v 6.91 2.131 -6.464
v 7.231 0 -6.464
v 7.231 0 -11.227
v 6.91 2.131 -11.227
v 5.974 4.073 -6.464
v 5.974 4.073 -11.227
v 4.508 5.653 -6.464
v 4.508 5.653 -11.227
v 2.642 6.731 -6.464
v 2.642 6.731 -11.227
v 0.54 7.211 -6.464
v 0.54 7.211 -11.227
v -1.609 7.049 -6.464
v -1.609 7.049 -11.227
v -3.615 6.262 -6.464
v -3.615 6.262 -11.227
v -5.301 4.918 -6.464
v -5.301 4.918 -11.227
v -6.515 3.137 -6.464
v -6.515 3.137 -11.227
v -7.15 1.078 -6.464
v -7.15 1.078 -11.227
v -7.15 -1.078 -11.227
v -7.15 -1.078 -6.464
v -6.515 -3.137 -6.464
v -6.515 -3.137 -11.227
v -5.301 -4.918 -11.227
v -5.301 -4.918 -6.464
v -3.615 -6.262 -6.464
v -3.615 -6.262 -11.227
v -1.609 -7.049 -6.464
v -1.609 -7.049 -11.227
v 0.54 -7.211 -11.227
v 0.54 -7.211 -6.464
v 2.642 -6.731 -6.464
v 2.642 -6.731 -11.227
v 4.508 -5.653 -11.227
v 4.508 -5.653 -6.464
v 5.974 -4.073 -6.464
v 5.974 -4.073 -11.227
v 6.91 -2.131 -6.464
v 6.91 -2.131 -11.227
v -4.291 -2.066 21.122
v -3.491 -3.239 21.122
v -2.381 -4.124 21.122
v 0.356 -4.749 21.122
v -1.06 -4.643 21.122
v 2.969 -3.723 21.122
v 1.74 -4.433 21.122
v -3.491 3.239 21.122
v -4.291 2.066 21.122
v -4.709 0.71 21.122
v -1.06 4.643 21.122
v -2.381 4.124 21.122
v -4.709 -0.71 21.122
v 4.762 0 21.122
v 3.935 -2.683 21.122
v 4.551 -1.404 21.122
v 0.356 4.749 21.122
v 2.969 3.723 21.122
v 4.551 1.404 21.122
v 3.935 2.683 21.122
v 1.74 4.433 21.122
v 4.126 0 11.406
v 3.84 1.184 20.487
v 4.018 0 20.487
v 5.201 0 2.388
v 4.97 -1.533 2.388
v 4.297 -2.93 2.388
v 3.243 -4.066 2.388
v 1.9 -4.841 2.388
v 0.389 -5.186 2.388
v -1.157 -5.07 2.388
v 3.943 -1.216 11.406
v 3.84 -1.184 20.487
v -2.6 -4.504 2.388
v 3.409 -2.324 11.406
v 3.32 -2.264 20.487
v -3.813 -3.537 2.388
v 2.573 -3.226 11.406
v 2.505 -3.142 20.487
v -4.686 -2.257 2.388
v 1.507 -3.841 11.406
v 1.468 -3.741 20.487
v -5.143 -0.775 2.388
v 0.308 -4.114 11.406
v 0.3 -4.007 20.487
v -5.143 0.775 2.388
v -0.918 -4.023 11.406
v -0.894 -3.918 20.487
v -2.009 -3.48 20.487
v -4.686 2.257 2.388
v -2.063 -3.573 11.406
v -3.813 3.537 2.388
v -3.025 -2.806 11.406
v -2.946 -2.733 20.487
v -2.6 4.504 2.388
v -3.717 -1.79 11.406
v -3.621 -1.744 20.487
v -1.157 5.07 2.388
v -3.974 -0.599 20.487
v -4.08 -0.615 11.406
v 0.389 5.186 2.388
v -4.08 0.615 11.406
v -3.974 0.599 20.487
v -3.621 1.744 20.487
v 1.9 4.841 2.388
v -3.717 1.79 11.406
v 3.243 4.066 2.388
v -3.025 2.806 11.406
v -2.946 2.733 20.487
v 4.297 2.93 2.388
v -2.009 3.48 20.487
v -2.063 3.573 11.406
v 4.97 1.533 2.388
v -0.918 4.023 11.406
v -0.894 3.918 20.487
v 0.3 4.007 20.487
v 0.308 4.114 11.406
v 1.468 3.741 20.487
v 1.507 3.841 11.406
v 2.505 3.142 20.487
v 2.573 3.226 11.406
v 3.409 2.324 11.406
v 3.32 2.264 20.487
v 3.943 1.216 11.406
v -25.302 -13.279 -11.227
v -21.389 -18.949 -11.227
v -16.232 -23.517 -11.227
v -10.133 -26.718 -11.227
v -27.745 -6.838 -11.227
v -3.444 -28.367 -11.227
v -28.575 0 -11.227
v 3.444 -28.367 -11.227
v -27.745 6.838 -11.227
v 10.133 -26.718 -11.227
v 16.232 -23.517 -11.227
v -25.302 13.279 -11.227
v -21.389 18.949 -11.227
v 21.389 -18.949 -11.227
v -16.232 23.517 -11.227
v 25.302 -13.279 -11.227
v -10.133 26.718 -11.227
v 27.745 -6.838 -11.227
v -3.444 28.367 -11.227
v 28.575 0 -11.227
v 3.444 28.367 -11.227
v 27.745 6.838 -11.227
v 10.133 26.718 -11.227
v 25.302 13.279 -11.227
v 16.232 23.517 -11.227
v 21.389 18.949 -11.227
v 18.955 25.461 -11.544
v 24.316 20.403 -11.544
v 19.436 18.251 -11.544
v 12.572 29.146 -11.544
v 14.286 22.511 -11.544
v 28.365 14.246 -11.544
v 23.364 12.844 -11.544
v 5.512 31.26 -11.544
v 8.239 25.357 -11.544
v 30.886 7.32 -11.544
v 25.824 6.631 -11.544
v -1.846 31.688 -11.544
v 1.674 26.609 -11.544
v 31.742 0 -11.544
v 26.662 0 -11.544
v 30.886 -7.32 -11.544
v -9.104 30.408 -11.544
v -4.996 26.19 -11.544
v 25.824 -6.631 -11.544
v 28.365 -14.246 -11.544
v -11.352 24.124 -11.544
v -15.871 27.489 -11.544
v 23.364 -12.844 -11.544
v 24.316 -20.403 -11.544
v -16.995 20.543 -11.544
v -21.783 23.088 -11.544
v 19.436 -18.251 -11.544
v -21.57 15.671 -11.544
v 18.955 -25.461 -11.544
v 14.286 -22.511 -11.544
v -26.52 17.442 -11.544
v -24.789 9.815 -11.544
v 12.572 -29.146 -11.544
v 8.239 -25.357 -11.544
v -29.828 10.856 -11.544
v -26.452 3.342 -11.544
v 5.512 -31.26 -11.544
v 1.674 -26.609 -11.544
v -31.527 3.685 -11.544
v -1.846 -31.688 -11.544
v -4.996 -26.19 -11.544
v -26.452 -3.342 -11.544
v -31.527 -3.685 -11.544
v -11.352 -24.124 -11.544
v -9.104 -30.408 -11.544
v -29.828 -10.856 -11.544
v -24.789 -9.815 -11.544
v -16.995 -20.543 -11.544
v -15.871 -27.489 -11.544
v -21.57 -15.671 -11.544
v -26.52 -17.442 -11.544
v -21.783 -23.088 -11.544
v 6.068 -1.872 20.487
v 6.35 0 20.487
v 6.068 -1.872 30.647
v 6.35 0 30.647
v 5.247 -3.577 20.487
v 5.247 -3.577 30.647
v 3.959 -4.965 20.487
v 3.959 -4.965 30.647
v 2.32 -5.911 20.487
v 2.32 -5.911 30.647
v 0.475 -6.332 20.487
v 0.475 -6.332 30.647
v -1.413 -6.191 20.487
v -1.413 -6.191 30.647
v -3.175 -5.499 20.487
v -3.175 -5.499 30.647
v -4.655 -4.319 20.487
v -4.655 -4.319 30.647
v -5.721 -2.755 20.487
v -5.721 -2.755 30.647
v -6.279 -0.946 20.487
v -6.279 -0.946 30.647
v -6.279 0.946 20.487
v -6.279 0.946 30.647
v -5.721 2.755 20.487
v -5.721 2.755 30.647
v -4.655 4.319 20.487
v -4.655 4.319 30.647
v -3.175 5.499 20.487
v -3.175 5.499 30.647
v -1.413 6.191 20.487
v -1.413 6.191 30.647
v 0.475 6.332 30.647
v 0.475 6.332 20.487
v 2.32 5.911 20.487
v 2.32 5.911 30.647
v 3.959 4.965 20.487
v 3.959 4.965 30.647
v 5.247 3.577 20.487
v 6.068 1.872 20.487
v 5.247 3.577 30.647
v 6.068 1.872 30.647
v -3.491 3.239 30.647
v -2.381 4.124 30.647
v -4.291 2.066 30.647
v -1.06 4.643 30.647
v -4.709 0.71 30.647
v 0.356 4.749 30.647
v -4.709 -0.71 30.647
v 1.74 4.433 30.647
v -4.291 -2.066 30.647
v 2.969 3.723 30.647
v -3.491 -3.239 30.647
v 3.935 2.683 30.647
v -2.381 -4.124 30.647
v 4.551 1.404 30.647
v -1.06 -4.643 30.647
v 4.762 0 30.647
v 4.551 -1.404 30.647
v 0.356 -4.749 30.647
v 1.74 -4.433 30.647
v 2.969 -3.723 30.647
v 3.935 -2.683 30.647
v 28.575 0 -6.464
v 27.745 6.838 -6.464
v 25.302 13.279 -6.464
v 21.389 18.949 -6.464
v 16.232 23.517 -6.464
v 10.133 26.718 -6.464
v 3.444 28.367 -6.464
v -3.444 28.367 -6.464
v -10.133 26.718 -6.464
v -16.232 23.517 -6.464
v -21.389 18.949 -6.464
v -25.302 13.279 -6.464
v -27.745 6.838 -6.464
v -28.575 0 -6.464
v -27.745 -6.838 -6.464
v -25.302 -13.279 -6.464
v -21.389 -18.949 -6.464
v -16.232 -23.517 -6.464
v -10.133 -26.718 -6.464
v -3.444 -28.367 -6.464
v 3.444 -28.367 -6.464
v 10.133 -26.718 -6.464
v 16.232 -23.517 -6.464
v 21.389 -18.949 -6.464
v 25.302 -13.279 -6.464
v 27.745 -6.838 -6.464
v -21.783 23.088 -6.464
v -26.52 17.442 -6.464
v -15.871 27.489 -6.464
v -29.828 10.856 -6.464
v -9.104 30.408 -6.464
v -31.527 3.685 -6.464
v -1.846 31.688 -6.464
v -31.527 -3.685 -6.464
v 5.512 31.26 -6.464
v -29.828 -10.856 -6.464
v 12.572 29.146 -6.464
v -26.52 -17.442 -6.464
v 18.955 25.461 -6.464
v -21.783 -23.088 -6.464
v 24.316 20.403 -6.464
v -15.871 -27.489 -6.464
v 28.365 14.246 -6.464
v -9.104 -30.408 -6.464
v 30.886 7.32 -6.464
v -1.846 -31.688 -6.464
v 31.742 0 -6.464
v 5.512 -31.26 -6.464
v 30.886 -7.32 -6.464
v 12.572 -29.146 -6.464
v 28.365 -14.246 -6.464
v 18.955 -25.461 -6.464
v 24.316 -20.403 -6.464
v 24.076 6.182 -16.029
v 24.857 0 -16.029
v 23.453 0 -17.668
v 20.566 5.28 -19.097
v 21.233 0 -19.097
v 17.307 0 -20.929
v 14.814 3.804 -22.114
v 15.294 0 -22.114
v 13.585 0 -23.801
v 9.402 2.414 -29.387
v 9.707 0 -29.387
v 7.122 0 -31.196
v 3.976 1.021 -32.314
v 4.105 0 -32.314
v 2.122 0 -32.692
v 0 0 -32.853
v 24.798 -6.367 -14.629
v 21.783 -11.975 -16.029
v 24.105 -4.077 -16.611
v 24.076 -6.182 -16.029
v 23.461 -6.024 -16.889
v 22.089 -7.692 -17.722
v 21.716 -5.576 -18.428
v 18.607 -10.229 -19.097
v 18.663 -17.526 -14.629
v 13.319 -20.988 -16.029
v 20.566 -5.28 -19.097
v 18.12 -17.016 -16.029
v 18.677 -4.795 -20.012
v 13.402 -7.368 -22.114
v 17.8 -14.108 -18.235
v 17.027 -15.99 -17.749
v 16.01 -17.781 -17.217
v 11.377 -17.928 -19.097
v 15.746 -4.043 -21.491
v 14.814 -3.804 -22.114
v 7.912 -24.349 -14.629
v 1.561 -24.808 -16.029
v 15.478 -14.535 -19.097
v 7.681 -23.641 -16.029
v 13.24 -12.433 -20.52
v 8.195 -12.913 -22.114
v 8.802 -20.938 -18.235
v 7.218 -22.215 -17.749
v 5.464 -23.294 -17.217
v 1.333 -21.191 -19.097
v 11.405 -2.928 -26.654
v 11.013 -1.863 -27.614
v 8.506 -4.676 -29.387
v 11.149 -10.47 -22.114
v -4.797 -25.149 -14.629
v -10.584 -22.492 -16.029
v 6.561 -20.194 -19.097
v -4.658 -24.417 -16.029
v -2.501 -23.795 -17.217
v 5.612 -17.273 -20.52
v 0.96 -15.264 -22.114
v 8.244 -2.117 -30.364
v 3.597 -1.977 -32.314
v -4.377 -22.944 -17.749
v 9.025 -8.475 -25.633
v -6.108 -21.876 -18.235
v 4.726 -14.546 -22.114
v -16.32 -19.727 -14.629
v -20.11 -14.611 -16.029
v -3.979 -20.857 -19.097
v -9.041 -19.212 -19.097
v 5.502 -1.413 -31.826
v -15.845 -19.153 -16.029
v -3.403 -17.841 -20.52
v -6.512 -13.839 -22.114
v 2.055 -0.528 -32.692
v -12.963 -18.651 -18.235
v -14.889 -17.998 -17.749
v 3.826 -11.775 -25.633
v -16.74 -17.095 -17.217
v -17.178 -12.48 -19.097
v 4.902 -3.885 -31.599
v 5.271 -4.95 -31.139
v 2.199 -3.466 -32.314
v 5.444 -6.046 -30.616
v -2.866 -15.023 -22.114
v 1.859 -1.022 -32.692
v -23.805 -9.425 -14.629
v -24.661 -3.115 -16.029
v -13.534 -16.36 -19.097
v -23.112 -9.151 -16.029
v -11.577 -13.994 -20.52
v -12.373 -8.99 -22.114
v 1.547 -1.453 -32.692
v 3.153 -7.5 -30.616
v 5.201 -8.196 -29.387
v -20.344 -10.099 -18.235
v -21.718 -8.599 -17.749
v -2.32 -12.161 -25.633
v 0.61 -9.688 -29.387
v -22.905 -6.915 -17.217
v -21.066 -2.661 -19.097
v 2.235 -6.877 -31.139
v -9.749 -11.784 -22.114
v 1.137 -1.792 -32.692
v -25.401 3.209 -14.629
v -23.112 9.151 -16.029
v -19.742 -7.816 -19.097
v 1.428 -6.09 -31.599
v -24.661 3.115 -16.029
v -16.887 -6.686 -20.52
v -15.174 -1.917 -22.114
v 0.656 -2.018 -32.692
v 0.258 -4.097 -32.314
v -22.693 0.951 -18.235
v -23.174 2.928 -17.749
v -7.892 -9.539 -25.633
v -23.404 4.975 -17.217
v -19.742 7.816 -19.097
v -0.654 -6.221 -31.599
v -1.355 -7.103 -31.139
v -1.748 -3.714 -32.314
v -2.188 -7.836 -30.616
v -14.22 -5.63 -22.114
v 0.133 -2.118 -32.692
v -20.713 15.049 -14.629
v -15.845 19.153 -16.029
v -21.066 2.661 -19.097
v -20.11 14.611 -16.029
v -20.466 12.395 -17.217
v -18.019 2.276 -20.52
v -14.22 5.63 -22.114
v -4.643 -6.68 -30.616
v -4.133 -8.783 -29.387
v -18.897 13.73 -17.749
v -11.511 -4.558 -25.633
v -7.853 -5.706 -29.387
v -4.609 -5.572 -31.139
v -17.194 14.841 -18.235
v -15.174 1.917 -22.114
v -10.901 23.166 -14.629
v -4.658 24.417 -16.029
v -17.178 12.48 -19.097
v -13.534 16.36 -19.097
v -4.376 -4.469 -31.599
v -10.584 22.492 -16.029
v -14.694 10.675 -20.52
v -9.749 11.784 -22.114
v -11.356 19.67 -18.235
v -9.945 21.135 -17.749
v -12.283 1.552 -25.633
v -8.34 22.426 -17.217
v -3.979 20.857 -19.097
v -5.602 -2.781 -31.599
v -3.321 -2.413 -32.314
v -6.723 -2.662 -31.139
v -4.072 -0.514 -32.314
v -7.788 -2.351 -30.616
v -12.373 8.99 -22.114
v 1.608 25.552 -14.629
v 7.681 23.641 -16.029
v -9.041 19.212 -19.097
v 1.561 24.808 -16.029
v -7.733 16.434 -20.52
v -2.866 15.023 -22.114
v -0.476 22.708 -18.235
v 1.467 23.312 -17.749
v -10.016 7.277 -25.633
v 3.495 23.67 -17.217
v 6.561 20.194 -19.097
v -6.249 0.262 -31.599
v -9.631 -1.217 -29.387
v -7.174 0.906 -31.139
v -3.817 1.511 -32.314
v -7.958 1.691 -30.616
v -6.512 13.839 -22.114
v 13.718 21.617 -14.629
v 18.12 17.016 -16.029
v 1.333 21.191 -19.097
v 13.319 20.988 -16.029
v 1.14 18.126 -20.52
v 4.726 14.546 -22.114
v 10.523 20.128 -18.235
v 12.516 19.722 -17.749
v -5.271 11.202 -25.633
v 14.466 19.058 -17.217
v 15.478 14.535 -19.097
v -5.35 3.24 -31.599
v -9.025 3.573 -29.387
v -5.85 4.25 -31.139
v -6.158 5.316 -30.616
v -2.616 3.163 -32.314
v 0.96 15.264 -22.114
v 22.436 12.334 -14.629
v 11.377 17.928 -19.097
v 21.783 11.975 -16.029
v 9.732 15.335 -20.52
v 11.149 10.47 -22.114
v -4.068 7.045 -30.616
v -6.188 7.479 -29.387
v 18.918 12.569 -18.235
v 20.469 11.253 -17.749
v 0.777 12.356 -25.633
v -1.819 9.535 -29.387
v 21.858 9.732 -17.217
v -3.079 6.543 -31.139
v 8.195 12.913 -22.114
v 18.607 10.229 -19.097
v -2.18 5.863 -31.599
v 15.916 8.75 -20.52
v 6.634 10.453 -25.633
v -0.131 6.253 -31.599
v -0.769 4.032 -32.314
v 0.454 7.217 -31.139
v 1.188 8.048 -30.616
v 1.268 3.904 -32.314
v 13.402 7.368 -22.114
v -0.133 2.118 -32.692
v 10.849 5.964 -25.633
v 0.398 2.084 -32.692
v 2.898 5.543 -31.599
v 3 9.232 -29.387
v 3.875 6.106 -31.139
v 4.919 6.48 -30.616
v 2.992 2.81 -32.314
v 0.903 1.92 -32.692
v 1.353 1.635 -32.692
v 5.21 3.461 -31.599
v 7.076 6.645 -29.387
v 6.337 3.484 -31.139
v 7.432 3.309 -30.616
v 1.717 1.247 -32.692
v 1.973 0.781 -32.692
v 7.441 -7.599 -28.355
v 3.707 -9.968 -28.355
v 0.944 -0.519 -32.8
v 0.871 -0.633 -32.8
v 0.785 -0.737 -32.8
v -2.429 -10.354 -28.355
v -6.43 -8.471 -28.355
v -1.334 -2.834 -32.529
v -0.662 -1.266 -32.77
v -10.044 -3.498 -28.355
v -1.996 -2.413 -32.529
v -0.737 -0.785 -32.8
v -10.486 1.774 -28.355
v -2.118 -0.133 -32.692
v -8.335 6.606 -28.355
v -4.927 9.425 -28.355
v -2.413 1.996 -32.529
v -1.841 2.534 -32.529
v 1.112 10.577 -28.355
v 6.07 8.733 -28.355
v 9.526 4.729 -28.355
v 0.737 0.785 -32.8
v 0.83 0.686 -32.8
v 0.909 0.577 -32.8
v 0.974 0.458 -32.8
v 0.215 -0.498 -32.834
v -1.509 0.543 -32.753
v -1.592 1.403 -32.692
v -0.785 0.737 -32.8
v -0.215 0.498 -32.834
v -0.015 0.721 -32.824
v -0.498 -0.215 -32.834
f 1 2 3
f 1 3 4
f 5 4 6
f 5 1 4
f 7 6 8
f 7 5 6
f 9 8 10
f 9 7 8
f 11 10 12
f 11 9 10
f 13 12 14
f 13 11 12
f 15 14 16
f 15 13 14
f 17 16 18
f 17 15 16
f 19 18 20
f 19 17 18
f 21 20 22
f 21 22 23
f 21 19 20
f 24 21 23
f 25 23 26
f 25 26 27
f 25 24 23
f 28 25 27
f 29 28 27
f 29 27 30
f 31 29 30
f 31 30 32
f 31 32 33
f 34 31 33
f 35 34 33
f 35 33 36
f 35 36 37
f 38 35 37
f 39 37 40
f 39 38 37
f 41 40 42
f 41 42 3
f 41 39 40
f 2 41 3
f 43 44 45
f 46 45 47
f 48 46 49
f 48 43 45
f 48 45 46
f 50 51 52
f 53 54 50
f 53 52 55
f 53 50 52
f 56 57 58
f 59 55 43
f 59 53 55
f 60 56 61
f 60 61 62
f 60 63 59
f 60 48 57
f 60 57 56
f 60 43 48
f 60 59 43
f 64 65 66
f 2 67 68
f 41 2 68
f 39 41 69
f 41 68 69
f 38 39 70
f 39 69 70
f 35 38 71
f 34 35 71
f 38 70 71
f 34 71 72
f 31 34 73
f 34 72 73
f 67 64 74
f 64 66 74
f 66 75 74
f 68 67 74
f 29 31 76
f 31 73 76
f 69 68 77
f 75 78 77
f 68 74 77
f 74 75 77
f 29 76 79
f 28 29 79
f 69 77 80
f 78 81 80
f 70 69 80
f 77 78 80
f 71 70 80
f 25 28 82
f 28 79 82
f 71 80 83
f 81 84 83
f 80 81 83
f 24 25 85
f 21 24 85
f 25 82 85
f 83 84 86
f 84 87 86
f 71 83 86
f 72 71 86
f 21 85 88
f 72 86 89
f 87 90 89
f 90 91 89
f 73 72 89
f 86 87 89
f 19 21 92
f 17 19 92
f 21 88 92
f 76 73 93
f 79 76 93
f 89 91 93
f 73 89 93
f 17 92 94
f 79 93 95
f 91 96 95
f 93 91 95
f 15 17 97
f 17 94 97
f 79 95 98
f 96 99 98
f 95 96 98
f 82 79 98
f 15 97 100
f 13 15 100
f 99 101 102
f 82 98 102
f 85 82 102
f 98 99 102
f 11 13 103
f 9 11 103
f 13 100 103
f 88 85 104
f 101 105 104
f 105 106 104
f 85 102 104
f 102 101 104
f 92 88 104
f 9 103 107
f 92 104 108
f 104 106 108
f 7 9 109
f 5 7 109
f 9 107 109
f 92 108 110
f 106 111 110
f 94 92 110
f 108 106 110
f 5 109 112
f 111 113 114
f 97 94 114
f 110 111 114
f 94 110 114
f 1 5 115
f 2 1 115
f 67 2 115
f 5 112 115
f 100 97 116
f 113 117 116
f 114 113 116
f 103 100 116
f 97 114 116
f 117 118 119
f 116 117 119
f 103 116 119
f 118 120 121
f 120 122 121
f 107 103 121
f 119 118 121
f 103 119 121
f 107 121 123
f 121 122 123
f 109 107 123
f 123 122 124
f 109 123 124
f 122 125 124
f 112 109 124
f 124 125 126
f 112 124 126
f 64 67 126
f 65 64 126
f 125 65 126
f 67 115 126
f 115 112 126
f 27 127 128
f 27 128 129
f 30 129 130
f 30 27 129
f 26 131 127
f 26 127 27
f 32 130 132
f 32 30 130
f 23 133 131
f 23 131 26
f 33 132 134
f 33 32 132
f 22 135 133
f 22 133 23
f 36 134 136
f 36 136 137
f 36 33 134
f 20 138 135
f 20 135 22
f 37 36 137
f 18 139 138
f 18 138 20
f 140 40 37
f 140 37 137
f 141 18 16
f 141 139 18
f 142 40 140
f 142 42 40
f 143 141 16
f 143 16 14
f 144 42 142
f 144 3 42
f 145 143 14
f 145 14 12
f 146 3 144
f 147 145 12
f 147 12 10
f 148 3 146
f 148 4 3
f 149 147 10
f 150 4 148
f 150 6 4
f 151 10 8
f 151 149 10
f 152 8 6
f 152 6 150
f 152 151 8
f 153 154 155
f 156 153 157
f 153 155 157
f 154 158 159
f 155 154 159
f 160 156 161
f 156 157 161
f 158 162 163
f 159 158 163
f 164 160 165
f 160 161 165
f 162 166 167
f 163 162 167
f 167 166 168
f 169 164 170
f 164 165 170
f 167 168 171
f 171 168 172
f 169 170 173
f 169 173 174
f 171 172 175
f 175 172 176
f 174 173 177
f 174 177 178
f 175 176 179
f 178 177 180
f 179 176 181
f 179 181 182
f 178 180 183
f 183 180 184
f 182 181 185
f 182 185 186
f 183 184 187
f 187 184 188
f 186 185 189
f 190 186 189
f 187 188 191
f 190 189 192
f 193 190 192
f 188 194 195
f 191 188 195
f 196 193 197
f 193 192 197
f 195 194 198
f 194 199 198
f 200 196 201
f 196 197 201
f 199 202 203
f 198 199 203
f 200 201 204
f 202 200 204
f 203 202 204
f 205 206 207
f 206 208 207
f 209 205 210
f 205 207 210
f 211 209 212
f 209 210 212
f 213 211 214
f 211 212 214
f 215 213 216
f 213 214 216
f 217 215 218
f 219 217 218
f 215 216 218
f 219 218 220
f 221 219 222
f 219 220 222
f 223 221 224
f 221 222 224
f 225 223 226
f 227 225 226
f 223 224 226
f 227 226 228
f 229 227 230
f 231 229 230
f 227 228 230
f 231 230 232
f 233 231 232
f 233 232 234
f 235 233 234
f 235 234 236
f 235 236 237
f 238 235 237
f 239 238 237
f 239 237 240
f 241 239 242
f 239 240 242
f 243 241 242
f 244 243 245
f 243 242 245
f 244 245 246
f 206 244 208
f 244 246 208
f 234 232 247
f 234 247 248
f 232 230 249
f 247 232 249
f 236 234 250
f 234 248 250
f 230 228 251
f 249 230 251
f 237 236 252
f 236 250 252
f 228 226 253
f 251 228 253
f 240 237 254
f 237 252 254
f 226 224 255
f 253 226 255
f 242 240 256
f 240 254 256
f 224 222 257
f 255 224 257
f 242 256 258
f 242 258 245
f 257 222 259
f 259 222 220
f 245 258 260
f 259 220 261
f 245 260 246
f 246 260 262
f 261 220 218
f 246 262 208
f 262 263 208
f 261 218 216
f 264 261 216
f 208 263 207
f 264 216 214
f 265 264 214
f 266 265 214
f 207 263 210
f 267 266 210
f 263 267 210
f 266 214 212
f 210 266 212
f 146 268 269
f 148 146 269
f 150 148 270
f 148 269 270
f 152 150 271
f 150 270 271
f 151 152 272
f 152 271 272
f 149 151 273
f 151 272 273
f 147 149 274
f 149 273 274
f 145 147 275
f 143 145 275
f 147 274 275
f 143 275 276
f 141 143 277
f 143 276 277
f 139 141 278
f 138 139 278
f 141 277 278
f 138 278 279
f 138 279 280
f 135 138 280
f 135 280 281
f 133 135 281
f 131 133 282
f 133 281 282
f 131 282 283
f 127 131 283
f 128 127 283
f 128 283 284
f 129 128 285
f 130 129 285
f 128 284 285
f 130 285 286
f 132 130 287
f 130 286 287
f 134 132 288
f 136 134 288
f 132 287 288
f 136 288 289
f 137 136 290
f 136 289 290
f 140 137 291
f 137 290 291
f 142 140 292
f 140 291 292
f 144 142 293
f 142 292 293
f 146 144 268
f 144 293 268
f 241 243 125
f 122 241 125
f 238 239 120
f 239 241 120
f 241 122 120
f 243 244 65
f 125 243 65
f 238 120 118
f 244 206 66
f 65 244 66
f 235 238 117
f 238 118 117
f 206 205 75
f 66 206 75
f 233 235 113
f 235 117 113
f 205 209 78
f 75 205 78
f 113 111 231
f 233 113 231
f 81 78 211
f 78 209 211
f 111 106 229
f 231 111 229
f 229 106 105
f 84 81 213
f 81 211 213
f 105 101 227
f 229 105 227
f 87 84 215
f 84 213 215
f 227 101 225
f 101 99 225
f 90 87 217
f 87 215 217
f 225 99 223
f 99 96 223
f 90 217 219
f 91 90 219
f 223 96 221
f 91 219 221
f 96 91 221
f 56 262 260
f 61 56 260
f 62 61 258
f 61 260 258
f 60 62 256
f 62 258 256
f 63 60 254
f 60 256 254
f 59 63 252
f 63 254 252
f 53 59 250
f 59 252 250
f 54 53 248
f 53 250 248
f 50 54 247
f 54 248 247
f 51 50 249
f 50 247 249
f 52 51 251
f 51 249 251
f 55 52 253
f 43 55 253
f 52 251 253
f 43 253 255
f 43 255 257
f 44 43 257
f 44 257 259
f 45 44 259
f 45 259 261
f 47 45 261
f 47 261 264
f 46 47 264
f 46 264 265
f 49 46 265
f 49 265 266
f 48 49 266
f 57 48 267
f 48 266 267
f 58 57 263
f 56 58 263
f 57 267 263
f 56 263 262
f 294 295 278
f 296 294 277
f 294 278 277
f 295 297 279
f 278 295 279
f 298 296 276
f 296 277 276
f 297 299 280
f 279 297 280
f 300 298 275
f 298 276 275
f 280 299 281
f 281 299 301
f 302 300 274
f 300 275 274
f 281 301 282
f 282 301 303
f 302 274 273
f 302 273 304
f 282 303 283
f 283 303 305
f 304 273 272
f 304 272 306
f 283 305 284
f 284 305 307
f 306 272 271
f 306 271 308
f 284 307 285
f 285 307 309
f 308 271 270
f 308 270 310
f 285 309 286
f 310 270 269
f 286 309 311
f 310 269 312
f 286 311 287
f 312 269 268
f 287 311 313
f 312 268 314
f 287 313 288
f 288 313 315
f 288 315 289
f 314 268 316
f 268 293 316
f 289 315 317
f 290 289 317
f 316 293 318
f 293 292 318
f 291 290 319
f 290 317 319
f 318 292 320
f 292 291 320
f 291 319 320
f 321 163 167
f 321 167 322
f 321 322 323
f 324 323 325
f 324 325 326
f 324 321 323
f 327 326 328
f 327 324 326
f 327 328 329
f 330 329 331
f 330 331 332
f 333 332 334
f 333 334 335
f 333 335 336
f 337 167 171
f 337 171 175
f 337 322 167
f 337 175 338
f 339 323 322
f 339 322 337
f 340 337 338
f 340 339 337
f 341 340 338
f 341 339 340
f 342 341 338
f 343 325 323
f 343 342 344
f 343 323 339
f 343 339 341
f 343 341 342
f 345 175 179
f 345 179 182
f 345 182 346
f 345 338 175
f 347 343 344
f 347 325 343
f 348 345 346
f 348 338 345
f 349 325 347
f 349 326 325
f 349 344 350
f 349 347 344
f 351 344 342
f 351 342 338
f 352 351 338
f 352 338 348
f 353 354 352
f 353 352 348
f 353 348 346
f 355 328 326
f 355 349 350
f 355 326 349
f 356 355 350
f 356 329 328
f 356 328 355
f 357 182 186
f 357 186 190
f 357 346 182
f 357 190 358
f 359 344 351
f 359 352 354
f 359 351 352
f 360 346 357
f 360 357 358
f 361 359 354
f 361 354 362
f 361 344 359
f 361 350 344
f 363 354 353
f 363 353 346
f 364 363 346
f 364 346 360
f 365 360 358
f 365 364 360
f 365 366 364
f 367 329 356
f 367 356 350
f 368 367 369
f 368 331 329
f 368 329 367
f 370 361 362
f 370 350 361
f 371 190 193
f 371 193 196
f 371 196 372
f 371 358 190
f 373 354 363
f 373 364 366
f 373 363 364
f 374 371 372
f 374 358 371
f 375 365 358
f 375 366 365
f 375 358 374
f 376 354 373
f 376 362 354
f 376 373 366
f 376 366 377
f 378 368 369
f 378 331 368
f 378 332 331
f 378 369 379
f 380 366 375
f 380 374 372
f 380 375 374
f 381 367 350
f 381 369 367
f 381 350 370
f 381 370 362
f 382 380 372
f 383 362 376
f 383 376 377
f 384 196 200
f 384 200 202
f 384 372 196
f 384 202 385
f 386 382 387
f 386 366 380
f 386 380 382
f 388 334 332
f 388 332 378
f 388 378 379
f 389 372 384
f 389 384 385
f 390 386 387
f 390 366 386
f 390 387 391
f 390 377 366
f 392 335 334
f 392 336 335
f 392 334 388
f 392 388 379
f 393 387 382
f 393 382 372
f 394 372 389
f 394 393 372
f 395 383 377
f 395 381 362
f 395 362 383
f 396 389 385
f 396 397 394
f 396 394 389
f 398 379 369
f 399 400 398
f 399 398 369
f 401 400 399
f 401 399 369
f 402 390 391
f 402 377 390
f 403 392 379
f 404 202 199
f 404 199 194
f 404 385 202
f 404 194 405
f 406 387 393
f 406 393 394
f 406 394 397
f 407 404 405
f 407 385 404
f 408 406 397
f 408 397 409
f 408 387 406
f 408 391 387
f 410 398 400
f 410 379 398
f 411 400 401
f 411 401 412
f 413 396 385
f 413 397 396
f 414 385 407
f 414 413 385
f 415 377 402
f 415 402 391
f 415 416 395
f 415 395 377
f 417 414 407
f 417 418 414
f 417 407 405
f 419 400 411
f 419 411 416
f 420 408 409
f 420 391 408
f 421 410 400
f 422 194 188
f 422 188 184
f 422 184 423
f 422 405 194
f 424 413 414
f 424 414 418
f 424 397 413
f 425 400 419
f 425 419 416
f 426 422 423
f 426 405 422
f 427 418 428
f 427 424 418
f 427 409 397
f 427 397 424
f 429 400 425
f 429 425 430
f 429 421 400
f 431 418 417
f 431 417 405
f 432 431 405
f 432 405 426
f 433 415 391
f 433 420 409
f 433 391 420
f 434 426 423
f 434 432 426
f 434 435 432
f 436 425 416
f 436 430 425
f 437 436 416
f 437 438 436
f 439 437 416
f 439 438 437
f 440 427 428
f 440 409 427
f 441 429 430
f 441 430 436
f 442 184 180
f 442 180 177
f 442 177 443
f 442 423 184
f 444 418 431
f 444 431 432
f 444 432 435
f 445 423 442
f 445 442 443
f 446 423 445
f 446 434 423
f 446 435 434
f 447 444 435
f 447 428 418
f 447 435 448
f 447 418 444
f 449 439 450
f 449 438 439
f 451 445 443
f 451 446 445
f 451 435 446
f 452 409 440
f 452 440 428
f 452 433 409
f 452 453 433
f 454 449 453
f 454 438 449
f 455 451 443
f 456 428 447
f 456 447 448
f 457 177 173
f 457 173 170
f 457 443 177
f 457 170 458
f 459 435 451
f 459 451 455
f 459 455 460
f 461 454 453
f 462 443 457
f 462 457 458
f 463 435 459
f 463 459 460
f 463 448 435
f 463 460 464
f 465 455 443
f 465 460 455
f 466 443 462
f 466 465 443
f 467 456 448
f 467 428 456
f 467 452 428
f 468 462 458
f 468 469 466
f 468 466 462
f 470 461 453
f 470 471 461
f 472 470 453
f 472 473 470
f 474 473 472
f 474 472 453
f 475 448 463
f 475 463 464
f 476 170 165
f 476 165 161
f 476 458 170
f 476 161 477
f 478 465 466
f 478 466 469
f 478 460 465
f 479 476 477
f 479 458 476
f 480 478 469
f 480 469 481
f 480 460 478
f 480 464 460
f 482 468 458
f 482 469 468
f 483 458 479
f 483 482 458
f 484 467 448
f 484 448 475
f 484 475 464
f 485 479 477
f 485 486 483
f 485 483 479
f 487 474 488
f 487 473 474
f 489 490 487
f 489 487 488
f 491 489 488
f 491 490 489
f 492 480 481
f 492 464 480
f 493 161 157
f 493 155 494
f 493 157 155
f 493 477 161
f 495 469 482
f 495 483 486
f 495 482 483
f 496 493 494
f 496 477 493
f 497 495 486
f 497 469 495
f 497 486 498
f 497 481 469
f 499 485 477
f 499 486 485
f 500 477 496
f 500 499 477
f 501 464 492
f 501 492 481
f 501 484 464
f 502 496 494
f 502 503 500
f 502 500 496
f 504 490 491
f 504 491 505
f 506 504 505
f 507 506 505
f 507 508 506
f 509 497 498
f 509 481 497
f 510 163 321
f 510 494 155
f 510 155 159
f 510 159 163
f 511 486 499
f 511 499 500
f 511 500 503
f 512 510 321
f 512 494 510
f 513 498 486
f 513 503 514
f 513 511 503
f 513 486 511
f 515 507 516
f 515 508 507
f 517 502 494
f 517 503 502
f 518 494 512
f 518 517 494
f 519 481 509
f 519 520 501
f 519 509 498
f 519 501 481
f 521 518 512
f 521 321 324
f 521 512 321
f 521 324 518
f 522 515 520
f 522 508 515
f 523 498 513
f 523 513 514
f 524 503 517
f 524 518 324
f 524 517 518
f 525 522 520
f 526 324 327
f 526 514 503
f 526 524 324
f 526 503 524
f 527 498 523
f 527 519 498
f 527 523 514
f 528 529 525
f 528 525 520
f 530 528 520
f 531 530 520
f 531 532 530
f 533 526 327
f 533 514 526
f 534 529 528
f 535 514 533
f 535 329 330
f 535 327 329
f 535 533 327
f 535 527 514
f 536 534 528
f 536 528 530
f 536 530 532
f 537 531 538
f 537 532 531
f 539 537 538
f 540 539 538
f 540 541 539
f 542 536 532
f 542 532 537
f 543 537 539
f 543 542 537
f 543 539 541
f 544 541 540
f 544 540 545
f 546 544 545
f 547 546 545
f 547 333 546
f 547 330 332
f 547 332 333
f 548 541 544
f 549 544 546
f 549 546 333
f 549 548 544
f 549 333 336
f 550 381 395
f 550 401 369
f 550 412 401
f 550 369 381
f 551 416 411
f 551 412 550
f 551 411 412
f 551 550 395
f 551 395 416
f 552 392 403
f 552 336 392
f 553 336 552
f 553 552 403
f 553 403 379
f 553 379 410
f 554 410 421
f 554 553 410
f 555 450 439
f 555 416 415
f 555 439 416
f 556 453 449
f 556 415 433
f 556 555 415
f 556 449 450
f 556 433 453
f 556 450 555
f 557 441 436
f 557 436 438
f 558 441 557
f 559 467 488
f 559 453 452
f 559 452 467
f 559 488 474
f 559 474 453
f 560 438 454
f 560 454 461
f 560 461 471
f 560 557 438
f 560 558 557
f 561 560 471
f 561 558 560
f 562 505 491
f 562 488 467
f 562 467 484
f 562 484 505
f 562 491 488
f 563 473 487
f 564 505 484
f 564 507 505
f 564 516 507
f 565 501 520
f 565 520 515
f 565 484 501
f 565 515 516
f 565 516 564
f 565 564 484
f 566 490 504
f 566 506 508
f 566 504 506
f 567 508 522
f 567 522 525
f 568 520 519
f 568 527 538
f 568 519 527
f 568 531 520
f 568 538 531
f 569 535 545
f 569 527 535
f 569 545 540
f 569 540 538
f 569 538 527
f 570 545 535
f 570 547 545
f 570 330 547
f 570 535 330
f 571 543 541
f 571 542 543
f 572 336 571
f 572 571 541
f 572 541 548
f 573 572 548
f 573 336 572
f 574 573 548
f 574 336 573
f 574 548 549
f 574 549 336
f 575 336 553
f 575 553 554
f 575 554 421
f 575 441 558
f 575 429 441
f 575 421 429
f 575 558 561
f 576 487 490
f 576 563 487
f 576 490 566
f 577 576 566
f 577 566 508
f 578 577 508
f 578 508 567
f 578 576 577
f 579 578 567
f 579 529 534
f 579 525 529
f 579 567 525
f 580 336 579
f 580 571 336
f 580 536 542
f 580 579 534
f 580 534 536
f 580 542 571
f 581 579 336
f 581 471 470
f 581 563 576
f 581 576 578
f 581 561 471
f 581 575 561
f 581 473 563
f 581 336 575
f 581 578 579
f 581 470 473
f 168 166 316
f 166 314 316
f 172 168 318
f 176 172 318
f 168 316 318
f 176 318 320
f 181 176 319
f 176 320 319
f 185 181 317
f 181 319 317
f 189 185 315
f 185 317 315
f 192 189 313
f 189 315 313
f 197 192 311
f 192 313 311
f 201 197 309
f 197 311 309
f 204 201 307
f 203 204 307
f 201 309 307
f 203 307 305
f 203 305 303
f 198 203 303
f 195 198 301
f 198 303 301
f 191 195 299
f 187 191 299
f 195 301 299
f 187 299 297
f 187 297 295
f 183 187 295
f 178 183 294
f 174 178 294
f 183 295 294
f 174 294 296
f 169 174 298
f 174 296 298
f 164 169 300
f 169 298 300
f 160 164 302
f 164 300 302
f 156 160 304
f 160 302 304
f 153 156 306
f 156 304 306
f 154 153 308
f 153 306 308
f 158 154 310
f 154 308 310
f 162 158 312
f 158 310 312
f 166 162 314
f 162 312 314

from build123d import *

# Parameters (mm, degrees)
F2_R     = 4.7625
F3_DEPTH = 9.525
F4_R     = 28.575
F4_R_2   = 7.2307717055
F5_DEPTH = 4.7625


with BuildPart() as f1:
    # F0 (on Front) → F1 (revolve)
    with BuildSketch(Plane.XZ):
        with BuildLine():
            Line((6.35, 30.6467008089), (0, 30.6467008089))
            Line((0, 30.6467008089), (0, -32.8532991911))
            add(Edge.make_bspline(
                [(26.6617717055, -11.54401084), (25.9701343115, -13.9314647613), (24.3508750064, -18.9183687036), (13.5457281466, -21.337726364), (11.0907767564, -30.071349519), (4.3230797164, -32.7566675842), (0, -32.8532991911)],
                knots=[0, 0, 0, 0, 0.2244751583, 0.4859098, 0.7233243068, 1, 1, 1, 1], degree=3))
            Line((26.6617717055, -11.54401084), (31.7417717055, -11.54401084))
            Line((31.7417717055, -11.54401084), (31.7417717055, -6.46401084))
            Line((31.7417717055, -6.46401084), (7.2307717055, -6.46401084))
            ThreePointArc((7.2307717055, -6.46401084), (4.5430528835, 6.8824310785), (4.018467851, 20.4867008089))
            Line((4.018467851, 20.4867008089), (6.35, 20.4867008089))
            Line((6.35, 20.4867008089), (6.35, 30.6467008089))
        make_face()
    revolve(axis=Axis((0, 0, -1.1032991911), (0, 0, -1)))

    # F2 (on face) → F3 (cut)
    with BuildSketch(Plane.XY.offset(30.6467008089)):
        Circle(F2_R)
    extrude(amount=-F3_DEPTH, mode=Mode.SUBTRACT)

    # F4 (on face) → F5 (cut)
    with BuildSketch(Plane.XY.offset(-6.46401084)):
        Circle(F4_R)
        Circle(F4_R_2, mode=Mode.SUBTRACT)
    extrude(amount=-F5_DEPTH, mode=Mode.SUBTRACT)


solid = f1.part
